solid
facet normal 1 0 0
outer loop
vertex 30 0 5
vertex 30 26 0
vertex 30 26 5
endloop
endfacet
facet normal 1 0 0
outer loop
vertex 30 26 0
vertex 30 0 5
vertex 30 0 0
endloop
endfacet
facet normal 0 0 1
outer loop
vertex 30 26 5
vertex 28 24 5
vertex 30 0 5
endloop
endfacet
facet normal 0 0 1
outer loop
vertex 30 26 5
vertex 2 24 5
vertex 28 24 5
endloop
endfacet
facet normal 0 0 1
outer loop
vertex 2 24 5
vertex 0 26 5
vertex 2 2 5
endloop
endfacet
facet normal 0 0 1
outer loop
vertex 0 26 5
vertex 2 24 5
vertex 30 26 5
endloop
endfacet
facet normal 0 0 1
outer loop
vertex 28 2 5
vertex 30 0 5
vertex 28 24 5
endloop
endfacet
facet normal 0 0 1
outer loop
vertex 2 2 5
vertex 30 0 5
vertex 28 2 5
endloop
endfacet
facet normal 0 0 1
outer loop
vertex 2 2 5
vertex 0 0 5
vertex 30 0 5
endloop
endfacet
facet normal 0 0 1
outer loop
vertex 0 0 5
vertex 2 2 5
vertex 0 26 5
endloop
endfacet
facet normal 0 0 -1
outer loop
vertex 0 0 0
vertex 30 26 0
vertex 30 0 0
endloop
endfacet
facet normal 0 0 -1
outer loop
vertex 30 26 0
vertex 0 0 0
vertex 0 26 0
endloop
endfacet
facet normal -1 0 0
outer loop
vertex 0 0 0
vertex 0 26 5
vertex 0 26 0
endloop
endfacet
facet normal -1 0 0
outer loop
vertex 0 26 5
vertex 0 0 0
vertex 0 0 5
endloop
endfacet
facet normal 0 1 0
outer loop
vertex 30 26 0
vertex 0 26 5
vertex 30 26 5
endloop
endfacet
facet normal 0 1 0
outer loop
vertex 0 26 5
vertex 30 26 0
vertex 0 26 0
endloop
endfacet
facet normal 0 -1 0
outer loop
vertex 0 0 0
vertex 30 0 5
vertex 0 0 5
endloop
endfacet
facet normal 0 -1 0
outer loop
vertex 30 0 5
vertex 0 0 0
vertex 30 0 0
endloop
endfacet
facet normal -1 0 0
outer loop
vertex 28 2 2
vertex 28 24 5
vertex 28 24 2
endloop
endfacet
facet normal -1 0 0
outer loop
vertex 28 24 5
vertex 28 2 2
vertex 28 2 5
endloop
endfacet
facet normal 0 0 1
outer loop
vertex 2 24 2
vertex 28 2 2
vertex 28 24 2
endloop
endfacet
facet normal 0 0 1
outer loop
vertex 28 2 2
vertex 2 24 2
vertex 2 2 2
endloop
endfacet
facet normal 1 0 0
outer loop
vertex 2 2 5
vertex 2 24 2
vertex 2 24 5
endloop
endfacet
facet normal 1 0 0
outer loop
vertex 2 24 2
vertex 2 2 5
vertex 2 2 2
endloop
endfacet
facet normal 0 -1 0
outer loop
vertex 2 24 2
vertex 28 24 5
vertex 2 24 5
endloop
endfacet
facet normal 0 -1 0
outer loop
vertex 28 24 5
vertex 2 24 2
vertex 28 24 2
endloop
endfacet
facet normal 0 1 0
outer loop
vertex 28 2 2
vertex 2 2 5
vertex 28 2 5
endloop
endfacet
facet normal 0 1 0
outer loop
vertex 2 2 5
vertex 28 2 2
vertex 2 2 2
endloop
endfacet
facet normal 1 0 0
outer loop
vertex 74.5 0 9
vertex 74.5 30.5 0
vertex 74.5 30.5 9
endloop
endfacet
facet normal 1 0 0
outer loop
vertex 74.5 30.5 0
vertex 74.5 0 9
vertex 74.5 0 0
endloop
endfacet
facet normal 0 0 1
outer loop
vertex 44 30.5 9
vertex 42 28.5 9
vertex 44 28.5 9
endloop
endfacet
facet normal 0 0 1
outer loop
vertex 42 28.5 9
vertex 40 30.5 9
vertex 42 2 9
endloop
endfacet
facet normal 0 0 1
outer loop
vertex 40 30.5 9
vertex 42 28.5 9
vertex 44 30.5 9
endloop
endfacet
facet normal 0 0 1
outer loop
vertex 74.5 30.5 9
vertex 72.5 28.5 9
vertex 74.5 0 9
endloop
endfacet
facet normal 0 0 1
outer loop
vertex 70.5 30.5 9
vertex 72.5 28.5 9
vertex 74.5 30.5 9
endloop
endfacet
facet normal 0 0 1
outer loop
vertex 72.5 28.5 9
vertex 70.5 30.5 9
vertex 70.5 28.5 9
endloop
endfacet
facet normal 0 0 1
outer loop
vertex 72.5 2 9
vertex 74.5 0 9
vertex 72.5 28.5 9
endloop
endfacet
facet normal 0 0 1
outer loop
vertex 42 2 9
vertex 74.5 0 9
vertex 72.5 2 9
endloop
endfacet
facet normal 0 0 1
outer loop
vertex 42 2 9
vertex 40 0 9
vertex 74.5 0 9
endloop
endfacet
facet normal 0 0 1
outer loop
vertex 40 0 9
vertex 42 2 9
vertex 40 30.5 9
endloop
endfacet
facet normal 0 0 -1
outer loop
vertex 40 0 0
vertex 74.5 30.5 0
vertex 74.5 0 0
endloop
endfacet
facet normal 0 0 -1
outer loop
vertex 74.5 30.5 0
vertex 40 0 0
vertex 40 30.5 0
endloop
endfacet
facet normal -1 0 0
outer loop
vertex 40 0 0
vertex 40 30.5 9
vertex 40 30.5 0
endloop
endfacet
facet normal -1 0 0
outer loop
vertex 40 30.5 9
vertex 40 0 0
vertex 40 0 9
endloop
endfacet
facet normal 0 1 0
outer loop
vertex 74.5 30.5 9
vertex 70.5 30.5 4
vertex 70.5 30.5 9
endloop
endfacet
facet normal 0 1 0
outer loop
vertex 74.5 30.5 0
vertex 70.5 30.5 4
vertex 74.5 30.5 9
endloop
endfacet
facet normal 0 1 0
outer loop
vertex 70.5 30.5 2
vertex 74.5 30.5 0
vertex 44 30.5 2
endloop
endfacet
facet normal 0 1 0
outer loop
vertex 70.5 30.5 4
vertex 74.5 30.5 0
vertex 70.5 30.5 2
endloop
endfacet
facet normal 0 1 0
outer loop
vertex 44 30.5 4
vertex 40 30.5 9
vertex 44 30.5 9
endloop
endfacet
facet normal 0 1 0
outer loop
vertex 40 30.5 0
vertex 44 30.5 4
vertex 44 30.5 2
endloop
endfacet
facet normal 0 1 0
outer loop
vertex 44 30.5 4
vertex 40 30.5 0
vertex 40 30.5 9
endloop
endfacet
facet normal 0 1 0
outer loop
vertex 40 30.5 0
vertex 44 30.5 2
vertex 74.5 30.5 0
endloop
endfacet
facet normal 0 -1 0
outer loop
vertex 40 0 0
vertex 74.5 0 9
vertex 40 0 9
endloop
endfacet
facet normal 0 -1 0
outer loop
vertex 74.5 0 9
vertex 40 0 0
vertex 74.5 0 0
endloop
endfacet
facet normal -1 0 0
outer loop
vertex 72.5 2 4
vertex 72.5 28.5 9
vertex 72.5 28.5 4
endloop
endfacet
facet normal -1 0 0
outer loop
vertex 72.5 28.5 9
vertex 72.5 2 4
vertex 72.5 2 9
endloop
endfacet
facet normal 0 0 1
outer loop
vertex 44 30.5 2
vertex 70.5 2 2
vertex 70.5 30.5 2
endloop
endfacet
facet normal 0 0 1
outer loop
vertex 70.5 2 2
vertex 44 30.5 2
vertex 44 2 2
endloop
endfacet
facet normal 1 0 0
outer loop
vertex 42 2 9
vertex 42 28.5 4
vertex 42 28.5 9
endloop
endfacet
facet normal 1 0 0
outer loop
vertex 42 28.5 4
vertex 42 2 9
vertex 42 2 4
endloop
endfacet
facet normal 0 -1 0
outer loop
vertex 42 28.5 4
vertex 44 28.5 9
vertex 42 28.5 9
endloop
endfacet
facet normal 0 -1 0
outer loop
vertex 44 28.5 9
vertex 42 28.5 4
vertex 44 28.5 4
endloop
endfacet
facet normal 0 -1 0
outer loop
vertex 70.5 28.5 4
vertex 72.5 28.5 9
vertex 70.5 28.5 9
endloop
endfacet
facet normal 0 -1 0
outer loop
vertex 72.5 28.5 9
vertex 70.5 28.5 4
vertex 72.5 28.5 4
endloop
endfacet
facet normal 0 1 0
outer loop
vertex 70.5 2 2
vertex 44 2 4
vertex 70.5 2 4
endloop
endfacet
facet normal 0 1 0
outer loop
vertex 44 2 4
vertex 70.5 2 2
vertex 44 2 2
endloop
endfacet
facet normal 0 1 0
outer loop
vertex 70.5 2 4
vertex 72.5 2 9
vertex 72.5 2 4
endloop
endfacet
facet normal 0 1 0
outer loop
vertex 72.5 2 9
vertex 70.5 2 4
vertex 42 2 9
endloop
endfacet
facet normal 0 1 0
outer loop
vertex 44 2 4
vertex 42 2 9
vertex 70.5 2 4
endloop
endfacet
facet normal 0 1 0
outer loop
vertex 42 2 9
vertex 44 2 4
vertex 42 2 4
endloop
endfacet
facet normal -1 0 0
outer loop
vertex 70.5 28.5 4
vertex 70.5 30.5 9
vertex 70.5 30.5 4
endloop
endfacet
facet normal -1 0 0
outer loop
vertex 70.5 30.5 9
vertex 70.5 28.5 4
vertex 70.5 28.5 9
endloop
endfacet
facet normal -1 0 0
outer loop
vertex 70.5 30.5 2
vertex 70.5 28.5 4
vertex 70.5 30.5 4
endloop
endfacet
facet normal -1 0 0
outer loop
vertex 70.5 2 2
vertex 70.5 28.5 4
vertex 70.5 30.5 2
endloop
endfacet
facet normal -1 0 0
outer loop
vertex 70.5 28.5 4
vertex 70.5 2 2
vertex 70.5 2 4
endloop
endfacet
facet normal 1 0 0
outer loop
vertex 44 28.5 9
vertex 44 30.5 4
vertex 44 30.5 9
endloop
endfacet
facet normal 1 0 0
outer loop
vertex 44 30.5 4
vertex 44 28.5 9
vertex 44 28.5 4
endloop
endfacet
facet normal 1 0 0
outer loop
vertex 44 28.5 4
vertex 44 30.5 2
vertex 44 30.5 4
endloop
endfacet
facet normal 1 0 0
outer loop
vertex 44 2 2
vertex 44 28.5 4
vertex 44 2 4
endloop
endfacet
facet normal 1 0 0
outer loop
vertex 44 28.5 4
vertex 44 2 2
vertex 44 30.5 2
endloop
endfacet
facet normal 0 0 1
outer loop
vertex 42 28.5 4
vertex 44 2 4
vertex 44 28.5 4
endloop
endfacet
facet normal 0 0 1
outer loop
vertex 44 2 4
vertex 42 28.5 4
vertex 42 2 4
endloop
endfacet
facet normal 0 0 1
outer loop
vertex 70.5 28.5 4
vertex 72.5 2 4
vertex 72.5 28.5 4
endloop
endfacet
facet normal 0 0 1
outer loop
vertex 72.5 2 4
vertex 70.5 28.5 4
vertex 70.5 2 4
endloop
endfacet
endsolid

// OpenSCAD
difference() {
	cube([30, 26, 5]);

	translate([2,2,2])
		cube([26, 22, 10]);	
}

translate([40, 0, 0]) {
	cube([4,30.5, 4]);

	translate([30.5, 0, 0])
		cube([4,30.5, 4]);

	difference() {
		cube([34.5, 30.5, 9]);

		translate([2,2,2])
			cube([30.5, 26.5, 10]);	
		
		translate([4,6,2])
			cube([26.5, 26.5, 10]);	
	}
}
